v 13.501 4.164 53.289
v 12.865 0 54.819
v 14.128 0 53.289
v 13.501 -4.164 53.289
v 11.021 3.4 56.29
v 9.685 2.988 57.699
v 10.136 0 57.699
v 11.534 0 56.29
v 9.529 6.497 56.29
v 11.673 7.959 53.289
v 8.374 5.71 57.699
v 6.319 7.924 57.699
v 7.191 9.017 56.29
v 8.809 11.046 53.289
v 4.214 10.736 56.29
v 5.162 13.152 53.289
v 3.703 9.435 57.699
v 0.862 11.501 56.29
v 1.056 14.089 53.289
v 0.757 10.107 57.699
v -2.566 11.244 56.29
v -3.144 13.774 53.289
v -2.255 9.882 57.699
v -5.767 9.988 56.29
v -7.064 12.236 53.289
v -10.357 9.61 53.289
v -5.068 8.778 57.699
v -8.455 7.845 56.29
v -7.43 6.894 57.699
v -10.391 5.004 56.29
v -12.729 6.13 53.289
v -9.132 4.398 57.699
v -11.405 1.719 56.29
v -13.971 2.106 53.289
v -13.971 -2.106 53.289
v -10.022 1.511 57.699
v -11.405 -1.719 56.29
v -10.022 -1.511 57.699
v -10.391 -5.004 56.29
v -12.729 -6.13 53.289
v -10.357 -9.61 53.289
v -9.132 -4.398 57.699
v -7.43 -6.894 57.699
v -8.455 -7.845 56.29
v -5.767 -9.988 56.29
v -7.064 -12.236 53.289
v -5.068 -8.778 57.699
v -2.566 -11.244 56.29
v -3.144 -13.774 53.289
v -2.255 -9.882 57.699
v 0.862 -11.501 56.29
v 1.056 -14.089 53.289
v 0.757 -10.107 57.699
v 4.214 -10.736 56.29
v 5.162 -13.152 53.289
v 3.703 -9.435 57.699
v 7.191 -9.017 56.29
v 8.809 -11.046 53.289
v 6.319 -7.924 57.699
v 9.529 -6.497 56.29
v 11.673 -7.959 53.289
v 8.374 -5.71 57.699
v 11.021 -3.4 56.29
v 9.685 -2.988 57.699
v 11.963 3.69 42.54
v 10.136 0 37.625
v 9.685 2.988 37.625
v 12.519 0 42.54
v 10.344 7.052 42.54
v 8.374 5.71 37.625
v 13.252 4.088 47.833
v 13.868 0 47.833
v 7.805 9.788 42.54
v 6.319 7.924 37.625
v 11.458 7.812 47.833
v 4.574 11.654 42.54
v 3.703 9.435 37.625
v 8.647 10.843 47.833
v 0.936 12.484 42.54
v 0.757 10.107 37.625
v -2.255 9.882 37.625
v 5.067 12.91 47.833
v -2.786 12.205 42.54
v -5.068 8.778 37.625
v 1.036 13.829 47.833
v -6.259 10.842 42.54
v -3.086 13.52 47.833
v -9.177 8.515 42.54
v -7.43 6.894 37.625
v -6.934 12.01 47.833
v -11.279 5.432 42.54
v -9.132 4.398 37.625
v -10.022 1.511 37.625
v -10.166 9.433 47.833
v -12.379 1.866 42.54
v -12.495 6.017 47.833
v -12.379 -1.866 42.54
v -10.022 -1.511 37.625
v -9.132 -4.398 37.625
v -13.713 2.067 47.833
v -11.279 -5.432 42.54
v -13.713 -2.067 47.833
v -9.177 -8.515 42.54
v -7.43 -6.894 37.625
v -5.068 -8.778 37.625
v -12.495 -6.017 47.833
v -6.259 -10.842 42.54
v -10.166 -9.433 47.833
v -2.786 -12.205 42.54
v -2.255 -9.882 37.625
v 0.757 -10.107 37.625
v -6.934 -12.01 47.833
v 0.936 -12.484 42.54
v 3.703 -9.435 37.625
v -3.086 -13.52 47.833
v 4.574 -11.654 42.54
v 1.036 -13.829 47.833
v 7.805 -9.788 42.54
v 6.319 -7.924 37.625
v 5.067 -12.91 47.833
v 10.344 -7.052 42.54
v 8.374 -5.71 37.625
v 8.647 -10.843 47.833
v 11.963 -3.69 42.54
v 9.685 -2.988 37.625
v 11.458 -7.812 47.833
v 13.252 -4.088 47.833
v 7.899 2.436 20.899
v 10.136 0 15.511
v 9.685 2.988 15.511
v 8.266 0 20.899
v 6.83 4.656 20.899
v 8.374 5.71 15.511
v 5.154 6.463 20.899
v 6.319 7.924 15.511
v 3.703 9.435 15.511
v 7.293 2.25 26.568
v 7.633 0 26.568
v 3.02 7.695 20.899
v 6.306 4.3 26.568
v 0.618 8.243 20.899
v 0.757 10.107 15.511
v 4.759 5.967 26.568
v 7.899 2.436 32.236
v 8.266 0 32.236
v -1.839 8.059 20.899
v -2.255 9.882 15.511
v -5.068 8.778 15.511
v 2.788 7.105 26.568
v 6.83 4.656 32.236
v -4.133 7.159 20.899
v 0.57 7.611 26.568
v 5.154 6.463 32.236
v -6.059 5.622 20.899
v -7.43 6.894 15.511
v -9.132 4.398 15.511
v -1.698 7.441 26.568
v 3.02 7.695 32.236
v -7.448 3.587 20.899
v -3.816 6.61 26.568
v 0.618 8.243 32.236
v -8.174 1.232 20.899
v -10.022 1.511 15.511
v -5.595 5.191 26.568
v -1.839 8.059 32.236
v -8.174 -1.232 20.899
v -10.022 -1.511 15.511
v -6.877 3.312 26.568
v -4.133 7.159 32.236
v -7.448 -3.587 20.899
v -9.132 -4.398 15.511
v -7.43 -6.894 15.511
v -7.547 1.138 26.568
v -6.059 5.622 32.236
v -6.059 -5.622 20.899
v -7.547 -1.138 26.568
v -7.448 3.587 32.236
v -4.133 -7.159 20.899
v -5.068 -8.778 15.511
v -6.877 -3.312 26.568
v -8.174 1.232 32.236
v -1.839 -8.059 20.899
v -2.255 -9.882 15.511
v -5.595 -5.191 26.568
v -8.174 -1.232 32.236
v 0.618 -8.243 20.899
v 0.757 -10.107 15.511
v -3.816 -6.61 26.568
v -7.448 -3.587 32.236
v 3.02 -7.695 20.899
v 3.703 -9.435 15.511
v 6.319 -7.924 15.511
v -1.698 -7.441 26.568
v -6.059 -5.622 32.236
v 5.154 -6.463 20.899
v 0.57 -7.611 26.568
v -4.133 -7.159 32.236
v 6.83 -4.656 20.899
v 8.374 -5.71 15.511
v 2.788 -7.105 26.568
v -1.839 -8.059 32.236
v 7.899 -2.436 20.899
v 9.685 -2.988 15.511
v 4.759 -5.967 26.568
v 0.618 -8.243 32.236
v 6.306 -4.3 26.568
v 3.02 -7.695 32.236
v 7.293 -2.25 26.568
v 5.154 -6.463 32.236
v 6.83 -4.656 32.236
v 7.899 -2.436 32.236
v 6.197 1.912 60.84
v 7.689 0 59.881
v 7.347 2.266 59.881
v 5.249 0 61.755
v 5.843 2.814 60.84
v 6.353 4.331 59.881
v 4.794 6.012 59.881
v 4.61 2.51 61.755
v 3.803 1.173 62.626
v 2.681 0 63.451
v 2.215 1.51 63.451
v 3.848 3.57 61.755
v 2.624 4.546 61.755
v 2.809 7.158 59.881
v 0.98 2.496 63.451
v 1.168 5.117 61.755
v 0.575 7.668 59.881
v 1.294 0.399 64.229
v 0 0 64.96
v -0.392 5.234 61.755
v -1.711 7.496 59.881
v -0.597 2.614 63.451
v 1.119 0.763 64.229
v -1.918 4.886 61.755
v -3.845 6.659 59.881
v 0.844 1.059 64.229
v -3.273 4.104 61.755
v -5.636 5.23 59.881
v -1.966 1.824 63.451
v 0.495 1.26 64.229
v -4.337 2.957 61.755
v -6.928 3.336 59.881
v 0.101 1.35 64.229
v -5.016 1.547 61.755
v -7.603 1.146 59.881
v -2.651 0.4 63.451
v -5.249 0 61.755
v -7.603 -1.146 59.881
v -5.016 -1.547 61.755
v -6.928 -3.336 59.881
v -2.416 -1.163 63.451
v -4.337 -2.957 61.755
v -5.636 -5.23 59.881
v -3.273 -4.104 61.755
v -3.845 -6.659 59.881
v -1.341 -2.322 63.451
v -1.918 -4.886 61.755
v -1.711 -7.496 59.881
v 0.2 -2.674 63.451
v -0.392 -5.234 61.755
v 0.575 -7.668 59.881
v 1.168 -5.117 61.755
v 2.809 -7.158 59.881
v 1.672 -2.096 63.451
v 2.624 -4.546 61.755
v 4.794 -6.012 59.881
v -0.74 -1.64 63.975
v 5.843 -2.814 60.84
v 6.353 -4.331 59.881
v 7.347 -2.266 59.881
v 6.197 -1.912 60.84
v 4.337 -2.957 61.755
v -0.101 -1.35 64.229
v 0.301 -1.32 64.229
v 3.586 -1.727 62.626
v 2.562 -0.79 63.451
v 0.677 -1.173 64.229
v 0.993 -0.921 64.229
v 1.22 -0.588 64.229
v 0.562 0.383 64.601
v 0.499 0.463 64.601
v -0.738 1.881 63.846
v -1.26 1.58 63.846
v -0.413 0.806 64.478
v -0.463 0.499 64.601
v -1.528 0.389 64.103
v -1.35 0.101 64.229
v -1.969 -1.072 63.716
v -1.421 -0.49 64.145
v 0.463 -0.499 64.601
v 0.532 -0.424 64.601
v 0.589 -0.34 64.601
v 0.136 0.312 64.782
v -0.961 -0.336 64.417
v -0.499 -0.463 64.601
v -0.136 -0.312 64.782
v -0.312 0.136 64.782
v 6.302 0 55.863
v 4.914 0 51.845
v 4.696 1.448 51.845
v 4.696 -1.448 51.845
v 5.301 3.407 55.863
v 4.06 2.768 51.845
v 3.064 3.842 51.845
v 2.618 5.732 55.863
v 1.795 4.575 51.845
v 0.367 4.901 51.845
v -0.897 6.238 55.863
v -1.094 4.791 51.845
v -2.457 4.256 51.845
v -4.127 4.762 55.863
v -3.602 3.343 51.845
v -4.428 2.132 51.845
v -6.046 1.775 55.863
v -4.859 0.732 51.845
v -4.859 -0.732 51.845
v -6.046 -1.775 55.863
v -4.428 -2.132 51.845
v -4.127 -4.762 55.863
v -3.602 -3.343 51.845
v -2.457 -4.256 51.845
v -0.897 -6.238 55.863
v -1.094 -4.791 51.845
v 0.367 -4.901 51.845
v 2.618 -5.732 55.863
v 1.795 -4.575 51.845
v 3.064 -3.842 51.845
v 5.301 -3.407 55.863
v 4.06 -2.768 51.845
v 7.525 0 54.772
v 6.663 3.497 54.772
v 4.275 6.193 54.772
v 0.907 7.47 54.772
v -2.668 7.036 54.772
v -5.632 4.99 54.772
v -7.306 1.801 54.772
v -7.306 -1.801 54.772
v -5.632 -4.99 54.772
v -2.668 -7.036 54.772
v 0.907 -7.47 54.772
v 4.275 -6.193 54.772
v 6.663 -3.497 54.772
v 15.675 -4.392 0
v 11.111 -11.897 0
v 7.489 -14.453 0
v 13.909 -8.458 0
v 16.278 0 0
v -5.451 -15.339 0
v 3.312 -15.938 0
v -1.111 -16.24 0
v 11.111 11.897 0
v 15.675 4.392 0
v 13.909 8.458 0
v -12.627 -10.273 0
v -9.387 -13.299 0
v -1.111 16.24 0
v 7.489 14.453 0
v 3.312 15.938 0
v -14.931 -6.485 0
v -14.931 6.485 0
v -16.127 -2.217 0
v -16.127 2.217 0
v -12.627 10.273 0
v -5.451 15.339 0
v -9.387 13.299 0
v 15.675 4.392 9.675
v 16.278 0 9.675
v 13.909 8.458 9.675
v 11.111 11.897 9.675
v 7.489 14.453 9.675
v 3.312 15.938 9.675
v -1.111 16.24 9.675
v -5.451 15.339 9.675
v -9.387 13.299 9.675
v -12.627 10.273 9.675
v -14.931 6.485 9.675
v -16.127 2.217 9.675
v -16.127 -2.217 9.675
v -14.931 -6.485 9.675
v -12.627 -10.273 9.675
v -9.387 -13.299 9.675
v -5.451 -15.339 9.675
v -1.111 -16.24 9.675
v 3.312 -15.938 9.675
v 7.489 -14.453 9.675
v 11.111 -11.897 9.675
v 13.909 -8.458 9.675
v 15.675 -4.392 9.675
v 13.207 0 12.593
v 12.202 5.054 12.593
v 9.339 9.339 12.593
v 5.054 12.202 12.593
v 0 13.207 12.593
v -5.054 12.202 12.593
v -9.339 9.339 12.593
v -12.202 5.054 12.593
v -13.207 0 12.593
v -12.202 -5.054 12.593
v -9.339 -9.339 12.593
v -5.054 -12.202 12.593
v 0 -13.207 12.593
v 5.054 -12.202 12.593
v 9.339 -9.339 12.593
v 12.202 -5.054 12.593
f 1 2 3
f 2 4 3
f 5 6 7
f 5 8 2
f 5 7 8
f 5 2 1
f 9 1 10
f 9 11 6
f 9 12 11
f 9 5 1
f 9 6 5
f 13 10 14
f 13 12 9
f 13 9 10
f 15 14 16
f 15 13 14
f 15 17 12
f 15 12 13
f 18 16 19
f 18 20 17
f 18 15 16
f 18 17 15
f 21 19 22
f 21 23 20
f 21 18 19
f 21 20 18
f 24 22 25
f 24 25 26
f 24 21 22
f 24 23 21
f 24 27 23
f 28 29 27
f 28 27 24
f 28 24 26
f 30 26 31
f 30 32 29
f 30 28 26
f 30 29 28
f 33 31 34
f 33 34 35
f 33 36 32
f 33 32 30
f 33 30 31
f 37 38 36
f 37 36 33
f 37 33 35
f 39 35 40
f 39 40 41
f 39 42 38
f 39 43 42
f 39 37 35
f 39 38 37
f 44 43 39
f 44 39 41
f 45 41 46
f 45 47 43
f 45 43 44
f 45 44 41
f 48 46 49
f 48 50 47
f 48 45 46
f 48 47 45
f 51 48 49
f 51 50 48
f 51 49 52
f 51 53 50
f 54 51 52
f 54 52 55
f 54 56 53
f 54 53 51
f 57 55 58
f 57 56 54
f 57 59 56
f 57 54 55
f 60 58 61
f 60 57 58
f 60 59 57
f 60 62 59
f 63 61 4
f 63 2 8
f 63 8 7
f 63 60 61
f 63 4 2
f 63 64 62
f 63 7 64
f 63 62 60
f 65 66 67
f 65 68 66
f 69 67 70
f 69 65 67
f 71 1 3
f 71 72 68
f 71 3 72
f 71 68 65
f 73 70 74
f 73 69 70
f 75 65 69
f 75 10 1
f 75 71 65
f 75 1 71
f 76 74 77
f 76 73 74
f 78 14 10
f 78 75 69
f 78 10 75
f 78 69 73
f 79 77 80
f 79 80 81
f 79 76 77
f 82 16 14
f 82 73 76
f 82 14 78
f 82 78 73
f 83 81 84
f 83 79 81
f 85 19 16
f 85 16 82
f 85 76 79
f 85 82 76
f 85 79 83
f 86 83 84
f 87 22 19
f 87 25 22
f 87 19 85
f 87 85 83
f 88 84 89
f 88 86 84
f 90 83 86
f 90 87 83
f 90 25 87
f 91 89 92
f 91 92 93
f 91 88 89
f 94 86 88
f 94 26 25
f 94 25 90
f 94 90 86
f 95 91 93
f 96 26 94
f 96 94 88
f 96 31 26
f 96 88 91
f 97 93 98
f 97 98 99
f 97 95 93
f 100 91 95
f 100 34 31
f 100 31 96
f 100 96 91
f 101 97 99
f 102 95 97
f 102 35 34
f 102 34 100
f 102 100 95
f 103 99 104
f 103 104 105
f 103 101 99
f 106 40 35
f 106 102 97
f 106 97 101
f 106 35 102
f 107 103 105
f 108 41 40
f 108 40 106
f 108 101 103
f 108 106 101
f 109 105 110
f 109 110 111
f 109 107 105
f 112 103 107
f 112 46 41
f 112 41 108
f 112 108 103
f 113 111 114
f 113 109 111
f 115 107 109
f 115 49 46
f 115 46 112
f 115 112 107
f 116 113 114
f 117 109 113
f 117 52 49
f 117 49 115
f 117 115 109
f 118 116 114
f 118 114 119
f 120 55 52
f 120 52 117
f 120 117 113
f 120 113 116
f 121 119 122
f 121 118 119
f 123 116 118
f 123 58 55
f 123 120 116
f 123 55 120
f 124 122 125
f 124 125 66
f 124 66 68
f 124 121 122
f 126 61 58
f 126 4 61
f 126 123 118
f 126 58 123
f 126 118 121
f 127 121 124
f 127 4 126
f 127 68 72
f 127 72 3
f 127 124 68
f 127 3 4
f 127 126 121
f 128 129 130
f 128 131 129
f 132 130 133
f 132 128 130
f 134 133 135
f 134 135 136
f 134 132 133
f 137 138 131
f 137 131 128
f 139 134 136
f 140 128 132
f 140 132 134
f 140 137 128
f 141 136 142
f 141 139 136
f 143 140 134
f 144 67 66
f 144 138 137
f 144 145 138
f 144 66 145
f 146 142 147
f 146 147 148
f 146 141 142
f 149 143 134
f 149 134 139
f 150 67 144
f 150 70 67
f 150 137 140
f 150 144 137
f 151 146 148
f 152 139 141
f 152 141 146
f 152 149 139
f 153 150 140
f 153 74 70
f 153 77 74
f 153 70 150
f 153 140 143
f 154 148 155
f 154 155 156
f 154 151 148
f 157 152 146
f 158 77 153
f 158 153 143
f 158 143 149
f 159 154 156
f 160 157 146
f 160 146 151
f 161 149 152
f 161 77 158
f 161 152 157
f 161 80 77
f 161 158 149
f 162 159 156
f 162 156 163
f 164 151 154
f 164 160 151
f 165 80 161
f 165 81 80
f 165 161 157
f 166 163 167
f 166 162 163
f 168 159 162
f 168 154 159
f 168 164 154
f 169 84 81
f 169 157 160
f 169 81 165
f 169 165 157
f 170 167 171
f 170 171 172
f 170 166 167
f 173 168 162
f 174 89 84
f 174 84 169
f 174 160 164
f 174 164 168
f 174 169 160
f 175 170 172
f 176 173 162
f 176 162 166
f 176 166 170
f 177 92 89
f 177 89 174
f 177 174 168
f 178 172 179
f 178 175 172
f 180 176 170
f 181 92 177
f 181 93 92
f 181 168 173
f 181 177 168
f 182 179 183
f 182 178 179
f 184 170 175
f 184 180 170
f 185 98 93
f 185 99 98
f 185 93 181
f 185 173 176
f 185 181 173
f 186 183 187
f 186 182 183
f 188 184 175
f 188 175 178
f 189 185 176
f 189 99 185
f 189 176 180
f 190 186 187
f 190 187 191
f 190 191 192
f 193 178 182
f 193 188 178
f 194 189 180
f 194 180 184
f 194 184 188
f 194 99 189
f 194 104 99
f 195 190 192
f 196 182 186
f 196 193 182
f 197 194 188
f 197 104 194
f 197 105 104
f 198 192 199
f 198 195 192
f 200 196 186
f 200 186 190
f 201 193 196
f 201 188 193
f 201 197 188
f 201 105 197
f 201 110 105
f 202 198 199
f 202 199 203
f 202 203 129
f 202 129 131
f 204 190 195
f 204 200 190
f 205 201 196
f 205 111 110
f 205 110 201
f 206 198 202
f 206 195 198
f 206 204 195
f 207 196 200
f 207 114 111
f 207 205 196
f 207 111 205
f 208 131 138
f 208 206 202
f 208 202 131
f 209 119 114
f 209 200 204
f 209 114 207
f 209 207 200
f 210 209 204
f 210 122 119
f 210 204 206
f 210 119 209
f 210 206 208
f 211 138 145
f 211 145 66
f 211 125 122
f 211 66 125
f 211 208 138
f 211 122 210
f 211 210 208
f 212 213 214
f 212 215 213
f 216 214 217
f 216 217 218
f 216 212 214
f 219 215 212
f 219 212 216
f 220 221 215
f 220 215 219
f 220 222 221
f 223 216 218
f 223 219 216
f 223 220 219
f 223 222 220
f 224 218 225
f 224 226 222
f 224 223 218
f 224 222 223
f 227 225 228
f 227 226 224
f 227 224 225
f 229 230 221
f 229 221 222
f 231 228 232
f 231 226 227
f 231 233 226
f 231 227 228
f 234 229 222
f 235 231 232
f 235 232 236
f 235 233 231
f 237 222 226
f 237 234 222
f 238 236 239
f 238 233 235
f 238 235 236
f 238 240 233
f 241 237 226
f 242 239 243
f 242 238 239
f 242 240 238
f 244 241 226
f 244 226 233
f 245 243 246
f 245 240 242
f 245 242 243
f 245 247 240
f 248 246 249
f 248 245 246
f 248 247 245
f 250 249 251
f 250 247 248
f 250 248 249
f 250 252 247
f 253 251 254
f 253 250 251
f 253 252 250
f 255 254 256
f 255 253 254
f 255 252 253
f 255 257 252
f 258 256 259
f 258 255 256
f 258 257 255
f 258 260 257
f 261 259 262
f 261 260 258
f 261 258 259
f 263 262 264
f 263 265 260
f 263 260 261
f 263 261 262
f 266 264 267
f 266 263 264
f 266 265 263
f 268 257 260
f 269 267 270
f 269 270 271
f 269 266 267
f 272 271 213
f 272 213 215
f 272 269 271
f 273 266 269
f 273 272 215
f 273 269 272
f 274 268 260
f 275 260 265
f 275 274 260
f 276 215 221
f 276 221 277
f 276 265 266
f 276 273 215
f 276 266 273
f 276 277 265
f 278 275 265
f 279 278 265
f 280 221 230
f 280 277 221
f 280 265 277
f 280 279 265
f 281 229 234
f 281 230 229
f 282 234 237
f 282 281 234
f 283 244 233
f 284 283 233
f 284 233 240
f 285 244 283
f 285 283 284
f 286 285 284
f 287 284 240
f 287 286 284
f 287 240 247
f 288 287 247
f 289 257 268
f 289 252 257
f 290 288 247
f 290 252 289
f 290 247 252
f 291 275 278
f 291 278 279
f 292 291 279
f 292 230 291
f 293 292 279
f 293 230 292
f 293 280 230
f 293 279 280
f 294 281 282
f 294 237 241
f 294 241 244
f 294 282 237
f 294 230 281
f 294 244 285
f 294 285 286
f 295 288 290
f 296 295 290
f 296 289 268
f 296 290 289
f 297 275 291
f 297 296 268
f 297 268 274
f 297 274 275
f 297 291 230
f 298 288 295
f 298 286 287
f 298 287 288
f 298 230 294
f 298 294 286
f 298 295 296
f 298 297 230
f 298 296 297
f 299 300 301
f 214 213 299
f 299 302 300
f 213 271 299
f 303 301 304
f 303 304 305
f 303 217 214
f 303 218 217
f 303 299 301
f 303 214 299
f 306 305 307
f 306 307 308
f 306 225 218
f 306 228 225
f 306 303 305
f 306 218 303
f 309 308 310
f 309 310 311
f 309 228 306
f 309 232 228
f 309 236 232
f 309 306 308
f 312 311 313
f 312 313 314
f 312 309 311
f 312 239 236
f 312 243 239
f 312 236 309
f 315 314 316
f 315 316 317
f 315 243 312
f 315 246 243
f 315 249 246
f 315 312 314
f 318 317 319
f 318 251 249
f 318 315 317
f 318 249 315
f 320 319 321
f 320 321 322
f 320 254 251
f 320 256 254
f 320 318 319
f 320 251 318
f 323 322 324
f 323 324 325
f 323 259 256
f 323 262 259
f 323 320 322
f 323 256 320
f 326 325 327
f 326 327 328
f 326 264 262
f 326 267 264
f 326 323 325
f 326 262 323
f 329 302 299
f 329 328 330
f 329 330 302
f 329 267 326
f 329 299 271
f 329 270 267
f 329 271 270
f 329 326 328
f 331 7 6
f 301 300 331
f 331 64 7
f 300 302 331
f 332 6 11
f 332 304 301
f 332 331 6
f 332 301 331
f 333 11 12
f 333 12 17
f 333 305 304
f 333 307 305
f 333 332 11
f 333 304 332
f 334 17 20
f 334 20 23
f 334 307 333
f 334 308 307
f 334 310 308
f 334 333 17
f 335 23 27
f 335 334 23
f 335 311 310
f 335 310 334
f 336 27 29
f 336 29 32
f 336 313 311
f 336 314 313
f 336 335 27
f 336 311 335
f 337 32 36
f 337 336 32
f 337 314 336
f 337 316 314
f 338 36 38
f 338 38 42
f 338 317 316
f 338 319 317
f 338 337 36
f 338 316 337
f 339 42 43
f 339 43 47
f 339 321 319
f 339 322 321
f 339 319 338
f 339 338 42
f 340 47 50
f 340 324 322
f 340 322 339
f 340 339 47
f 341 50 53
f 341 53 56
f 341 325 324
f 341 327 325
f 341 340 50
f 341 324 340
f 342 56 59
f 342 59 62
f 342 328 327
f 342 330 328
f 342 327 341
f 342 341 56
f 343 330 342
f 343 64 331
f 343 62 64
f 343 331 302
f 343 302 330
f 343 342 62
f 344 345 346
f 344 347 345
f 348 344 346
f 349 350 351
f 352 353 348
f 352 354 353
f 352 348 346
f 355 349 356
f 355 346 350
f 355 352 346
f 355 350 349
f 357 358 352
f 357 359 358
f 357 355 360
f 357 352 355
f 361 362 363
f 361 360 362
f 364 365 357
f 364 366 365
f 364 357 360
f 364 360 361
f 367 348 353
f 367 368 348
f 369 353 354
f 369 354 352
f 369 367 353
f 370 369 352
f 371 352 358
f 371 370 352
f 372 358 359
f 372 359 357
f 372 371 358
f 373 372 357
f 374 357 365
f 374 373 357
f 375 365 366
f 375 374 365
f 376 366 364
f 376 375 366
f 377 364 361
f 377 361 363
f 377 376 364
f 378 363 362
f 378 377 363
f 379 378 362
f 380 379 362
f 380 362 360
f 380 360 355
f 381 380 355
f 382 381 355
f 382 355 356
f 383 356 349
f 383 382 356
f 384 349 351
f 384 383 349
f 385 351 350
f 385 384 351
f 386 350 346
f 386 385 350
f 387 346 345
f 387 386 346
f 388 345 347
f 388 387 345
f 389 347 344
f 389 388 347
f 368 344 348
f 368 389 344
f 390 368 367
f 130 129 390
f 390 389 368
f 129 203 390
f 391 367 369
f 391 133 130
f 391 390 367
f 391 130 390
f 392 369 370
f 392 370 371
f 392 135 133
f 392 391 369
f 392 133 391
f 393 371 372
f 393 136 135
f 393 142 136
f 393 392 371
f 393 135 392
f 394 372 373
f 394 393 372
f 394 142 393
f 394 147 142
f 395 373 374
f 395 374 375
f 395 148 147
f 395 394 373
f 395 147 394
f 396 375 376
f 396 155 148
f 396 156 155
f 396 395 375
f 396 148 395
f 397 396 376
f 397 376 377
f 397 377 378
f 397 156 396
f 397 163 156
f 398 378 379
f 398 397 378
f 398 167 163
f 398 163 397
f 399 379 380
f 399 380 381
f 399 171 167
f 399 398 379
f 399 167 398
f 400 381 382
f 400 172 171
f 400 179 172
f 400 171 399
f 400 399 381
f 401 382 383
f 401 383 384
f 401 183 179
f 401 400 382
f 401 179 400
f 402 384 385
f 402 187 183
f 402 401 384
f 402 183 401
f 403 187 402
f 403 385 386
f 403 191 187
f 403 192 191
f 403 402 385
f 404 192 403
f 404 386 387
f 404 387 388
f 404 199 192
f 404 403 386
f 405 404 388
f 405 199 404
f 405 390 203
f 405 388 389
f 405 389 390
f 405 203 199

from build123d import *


with BuildPart() as f1:
    # F0 (on Front) → F1 (revolve)
    with BuildSketch(Plane.XZ):
        with BuildLine():
            ThreePointArc((10.1356245577, 37.6246646047), (13.3272956222, 45.1520650335), (14.128446579, 53.2888136804))
            ThreePointArc((14.128446579, 53.2888136804), (12.2078947119, 55.5624464713), (10.1356245577, 57.6987100202))
            Line((10.1356245577, 57.6987100202), (4.9142432399, 51.845254764))
            Line((4.9142432399, 51.845254764), (7.6890488201, 59.8808432291))
            ThreePointArc((7.6890488201, 59.8808432291), (3.9800972298, 62.6257206248), (0, 64.9601370096))
            Line((0, 64.9601370096), (0, 0))
            Line((0, 0), (16.2784270942, 0))
            Line((16.2784270942, 0), (16.2784270942, 9.6749141812))
            Line((16.2784270942, 9.6749141812), (10.1356245577, 15.5105758458))
            ThreePointArc((10.1356245577, 15.5105758458), (7.6325309522, 26.5676202253), (10.1356245577, 37.6246646047))
        make_face()
    revolve(axis=Axis((0, 0, 32.4800685048), (0, 0, 1)))


solid = f1.part
